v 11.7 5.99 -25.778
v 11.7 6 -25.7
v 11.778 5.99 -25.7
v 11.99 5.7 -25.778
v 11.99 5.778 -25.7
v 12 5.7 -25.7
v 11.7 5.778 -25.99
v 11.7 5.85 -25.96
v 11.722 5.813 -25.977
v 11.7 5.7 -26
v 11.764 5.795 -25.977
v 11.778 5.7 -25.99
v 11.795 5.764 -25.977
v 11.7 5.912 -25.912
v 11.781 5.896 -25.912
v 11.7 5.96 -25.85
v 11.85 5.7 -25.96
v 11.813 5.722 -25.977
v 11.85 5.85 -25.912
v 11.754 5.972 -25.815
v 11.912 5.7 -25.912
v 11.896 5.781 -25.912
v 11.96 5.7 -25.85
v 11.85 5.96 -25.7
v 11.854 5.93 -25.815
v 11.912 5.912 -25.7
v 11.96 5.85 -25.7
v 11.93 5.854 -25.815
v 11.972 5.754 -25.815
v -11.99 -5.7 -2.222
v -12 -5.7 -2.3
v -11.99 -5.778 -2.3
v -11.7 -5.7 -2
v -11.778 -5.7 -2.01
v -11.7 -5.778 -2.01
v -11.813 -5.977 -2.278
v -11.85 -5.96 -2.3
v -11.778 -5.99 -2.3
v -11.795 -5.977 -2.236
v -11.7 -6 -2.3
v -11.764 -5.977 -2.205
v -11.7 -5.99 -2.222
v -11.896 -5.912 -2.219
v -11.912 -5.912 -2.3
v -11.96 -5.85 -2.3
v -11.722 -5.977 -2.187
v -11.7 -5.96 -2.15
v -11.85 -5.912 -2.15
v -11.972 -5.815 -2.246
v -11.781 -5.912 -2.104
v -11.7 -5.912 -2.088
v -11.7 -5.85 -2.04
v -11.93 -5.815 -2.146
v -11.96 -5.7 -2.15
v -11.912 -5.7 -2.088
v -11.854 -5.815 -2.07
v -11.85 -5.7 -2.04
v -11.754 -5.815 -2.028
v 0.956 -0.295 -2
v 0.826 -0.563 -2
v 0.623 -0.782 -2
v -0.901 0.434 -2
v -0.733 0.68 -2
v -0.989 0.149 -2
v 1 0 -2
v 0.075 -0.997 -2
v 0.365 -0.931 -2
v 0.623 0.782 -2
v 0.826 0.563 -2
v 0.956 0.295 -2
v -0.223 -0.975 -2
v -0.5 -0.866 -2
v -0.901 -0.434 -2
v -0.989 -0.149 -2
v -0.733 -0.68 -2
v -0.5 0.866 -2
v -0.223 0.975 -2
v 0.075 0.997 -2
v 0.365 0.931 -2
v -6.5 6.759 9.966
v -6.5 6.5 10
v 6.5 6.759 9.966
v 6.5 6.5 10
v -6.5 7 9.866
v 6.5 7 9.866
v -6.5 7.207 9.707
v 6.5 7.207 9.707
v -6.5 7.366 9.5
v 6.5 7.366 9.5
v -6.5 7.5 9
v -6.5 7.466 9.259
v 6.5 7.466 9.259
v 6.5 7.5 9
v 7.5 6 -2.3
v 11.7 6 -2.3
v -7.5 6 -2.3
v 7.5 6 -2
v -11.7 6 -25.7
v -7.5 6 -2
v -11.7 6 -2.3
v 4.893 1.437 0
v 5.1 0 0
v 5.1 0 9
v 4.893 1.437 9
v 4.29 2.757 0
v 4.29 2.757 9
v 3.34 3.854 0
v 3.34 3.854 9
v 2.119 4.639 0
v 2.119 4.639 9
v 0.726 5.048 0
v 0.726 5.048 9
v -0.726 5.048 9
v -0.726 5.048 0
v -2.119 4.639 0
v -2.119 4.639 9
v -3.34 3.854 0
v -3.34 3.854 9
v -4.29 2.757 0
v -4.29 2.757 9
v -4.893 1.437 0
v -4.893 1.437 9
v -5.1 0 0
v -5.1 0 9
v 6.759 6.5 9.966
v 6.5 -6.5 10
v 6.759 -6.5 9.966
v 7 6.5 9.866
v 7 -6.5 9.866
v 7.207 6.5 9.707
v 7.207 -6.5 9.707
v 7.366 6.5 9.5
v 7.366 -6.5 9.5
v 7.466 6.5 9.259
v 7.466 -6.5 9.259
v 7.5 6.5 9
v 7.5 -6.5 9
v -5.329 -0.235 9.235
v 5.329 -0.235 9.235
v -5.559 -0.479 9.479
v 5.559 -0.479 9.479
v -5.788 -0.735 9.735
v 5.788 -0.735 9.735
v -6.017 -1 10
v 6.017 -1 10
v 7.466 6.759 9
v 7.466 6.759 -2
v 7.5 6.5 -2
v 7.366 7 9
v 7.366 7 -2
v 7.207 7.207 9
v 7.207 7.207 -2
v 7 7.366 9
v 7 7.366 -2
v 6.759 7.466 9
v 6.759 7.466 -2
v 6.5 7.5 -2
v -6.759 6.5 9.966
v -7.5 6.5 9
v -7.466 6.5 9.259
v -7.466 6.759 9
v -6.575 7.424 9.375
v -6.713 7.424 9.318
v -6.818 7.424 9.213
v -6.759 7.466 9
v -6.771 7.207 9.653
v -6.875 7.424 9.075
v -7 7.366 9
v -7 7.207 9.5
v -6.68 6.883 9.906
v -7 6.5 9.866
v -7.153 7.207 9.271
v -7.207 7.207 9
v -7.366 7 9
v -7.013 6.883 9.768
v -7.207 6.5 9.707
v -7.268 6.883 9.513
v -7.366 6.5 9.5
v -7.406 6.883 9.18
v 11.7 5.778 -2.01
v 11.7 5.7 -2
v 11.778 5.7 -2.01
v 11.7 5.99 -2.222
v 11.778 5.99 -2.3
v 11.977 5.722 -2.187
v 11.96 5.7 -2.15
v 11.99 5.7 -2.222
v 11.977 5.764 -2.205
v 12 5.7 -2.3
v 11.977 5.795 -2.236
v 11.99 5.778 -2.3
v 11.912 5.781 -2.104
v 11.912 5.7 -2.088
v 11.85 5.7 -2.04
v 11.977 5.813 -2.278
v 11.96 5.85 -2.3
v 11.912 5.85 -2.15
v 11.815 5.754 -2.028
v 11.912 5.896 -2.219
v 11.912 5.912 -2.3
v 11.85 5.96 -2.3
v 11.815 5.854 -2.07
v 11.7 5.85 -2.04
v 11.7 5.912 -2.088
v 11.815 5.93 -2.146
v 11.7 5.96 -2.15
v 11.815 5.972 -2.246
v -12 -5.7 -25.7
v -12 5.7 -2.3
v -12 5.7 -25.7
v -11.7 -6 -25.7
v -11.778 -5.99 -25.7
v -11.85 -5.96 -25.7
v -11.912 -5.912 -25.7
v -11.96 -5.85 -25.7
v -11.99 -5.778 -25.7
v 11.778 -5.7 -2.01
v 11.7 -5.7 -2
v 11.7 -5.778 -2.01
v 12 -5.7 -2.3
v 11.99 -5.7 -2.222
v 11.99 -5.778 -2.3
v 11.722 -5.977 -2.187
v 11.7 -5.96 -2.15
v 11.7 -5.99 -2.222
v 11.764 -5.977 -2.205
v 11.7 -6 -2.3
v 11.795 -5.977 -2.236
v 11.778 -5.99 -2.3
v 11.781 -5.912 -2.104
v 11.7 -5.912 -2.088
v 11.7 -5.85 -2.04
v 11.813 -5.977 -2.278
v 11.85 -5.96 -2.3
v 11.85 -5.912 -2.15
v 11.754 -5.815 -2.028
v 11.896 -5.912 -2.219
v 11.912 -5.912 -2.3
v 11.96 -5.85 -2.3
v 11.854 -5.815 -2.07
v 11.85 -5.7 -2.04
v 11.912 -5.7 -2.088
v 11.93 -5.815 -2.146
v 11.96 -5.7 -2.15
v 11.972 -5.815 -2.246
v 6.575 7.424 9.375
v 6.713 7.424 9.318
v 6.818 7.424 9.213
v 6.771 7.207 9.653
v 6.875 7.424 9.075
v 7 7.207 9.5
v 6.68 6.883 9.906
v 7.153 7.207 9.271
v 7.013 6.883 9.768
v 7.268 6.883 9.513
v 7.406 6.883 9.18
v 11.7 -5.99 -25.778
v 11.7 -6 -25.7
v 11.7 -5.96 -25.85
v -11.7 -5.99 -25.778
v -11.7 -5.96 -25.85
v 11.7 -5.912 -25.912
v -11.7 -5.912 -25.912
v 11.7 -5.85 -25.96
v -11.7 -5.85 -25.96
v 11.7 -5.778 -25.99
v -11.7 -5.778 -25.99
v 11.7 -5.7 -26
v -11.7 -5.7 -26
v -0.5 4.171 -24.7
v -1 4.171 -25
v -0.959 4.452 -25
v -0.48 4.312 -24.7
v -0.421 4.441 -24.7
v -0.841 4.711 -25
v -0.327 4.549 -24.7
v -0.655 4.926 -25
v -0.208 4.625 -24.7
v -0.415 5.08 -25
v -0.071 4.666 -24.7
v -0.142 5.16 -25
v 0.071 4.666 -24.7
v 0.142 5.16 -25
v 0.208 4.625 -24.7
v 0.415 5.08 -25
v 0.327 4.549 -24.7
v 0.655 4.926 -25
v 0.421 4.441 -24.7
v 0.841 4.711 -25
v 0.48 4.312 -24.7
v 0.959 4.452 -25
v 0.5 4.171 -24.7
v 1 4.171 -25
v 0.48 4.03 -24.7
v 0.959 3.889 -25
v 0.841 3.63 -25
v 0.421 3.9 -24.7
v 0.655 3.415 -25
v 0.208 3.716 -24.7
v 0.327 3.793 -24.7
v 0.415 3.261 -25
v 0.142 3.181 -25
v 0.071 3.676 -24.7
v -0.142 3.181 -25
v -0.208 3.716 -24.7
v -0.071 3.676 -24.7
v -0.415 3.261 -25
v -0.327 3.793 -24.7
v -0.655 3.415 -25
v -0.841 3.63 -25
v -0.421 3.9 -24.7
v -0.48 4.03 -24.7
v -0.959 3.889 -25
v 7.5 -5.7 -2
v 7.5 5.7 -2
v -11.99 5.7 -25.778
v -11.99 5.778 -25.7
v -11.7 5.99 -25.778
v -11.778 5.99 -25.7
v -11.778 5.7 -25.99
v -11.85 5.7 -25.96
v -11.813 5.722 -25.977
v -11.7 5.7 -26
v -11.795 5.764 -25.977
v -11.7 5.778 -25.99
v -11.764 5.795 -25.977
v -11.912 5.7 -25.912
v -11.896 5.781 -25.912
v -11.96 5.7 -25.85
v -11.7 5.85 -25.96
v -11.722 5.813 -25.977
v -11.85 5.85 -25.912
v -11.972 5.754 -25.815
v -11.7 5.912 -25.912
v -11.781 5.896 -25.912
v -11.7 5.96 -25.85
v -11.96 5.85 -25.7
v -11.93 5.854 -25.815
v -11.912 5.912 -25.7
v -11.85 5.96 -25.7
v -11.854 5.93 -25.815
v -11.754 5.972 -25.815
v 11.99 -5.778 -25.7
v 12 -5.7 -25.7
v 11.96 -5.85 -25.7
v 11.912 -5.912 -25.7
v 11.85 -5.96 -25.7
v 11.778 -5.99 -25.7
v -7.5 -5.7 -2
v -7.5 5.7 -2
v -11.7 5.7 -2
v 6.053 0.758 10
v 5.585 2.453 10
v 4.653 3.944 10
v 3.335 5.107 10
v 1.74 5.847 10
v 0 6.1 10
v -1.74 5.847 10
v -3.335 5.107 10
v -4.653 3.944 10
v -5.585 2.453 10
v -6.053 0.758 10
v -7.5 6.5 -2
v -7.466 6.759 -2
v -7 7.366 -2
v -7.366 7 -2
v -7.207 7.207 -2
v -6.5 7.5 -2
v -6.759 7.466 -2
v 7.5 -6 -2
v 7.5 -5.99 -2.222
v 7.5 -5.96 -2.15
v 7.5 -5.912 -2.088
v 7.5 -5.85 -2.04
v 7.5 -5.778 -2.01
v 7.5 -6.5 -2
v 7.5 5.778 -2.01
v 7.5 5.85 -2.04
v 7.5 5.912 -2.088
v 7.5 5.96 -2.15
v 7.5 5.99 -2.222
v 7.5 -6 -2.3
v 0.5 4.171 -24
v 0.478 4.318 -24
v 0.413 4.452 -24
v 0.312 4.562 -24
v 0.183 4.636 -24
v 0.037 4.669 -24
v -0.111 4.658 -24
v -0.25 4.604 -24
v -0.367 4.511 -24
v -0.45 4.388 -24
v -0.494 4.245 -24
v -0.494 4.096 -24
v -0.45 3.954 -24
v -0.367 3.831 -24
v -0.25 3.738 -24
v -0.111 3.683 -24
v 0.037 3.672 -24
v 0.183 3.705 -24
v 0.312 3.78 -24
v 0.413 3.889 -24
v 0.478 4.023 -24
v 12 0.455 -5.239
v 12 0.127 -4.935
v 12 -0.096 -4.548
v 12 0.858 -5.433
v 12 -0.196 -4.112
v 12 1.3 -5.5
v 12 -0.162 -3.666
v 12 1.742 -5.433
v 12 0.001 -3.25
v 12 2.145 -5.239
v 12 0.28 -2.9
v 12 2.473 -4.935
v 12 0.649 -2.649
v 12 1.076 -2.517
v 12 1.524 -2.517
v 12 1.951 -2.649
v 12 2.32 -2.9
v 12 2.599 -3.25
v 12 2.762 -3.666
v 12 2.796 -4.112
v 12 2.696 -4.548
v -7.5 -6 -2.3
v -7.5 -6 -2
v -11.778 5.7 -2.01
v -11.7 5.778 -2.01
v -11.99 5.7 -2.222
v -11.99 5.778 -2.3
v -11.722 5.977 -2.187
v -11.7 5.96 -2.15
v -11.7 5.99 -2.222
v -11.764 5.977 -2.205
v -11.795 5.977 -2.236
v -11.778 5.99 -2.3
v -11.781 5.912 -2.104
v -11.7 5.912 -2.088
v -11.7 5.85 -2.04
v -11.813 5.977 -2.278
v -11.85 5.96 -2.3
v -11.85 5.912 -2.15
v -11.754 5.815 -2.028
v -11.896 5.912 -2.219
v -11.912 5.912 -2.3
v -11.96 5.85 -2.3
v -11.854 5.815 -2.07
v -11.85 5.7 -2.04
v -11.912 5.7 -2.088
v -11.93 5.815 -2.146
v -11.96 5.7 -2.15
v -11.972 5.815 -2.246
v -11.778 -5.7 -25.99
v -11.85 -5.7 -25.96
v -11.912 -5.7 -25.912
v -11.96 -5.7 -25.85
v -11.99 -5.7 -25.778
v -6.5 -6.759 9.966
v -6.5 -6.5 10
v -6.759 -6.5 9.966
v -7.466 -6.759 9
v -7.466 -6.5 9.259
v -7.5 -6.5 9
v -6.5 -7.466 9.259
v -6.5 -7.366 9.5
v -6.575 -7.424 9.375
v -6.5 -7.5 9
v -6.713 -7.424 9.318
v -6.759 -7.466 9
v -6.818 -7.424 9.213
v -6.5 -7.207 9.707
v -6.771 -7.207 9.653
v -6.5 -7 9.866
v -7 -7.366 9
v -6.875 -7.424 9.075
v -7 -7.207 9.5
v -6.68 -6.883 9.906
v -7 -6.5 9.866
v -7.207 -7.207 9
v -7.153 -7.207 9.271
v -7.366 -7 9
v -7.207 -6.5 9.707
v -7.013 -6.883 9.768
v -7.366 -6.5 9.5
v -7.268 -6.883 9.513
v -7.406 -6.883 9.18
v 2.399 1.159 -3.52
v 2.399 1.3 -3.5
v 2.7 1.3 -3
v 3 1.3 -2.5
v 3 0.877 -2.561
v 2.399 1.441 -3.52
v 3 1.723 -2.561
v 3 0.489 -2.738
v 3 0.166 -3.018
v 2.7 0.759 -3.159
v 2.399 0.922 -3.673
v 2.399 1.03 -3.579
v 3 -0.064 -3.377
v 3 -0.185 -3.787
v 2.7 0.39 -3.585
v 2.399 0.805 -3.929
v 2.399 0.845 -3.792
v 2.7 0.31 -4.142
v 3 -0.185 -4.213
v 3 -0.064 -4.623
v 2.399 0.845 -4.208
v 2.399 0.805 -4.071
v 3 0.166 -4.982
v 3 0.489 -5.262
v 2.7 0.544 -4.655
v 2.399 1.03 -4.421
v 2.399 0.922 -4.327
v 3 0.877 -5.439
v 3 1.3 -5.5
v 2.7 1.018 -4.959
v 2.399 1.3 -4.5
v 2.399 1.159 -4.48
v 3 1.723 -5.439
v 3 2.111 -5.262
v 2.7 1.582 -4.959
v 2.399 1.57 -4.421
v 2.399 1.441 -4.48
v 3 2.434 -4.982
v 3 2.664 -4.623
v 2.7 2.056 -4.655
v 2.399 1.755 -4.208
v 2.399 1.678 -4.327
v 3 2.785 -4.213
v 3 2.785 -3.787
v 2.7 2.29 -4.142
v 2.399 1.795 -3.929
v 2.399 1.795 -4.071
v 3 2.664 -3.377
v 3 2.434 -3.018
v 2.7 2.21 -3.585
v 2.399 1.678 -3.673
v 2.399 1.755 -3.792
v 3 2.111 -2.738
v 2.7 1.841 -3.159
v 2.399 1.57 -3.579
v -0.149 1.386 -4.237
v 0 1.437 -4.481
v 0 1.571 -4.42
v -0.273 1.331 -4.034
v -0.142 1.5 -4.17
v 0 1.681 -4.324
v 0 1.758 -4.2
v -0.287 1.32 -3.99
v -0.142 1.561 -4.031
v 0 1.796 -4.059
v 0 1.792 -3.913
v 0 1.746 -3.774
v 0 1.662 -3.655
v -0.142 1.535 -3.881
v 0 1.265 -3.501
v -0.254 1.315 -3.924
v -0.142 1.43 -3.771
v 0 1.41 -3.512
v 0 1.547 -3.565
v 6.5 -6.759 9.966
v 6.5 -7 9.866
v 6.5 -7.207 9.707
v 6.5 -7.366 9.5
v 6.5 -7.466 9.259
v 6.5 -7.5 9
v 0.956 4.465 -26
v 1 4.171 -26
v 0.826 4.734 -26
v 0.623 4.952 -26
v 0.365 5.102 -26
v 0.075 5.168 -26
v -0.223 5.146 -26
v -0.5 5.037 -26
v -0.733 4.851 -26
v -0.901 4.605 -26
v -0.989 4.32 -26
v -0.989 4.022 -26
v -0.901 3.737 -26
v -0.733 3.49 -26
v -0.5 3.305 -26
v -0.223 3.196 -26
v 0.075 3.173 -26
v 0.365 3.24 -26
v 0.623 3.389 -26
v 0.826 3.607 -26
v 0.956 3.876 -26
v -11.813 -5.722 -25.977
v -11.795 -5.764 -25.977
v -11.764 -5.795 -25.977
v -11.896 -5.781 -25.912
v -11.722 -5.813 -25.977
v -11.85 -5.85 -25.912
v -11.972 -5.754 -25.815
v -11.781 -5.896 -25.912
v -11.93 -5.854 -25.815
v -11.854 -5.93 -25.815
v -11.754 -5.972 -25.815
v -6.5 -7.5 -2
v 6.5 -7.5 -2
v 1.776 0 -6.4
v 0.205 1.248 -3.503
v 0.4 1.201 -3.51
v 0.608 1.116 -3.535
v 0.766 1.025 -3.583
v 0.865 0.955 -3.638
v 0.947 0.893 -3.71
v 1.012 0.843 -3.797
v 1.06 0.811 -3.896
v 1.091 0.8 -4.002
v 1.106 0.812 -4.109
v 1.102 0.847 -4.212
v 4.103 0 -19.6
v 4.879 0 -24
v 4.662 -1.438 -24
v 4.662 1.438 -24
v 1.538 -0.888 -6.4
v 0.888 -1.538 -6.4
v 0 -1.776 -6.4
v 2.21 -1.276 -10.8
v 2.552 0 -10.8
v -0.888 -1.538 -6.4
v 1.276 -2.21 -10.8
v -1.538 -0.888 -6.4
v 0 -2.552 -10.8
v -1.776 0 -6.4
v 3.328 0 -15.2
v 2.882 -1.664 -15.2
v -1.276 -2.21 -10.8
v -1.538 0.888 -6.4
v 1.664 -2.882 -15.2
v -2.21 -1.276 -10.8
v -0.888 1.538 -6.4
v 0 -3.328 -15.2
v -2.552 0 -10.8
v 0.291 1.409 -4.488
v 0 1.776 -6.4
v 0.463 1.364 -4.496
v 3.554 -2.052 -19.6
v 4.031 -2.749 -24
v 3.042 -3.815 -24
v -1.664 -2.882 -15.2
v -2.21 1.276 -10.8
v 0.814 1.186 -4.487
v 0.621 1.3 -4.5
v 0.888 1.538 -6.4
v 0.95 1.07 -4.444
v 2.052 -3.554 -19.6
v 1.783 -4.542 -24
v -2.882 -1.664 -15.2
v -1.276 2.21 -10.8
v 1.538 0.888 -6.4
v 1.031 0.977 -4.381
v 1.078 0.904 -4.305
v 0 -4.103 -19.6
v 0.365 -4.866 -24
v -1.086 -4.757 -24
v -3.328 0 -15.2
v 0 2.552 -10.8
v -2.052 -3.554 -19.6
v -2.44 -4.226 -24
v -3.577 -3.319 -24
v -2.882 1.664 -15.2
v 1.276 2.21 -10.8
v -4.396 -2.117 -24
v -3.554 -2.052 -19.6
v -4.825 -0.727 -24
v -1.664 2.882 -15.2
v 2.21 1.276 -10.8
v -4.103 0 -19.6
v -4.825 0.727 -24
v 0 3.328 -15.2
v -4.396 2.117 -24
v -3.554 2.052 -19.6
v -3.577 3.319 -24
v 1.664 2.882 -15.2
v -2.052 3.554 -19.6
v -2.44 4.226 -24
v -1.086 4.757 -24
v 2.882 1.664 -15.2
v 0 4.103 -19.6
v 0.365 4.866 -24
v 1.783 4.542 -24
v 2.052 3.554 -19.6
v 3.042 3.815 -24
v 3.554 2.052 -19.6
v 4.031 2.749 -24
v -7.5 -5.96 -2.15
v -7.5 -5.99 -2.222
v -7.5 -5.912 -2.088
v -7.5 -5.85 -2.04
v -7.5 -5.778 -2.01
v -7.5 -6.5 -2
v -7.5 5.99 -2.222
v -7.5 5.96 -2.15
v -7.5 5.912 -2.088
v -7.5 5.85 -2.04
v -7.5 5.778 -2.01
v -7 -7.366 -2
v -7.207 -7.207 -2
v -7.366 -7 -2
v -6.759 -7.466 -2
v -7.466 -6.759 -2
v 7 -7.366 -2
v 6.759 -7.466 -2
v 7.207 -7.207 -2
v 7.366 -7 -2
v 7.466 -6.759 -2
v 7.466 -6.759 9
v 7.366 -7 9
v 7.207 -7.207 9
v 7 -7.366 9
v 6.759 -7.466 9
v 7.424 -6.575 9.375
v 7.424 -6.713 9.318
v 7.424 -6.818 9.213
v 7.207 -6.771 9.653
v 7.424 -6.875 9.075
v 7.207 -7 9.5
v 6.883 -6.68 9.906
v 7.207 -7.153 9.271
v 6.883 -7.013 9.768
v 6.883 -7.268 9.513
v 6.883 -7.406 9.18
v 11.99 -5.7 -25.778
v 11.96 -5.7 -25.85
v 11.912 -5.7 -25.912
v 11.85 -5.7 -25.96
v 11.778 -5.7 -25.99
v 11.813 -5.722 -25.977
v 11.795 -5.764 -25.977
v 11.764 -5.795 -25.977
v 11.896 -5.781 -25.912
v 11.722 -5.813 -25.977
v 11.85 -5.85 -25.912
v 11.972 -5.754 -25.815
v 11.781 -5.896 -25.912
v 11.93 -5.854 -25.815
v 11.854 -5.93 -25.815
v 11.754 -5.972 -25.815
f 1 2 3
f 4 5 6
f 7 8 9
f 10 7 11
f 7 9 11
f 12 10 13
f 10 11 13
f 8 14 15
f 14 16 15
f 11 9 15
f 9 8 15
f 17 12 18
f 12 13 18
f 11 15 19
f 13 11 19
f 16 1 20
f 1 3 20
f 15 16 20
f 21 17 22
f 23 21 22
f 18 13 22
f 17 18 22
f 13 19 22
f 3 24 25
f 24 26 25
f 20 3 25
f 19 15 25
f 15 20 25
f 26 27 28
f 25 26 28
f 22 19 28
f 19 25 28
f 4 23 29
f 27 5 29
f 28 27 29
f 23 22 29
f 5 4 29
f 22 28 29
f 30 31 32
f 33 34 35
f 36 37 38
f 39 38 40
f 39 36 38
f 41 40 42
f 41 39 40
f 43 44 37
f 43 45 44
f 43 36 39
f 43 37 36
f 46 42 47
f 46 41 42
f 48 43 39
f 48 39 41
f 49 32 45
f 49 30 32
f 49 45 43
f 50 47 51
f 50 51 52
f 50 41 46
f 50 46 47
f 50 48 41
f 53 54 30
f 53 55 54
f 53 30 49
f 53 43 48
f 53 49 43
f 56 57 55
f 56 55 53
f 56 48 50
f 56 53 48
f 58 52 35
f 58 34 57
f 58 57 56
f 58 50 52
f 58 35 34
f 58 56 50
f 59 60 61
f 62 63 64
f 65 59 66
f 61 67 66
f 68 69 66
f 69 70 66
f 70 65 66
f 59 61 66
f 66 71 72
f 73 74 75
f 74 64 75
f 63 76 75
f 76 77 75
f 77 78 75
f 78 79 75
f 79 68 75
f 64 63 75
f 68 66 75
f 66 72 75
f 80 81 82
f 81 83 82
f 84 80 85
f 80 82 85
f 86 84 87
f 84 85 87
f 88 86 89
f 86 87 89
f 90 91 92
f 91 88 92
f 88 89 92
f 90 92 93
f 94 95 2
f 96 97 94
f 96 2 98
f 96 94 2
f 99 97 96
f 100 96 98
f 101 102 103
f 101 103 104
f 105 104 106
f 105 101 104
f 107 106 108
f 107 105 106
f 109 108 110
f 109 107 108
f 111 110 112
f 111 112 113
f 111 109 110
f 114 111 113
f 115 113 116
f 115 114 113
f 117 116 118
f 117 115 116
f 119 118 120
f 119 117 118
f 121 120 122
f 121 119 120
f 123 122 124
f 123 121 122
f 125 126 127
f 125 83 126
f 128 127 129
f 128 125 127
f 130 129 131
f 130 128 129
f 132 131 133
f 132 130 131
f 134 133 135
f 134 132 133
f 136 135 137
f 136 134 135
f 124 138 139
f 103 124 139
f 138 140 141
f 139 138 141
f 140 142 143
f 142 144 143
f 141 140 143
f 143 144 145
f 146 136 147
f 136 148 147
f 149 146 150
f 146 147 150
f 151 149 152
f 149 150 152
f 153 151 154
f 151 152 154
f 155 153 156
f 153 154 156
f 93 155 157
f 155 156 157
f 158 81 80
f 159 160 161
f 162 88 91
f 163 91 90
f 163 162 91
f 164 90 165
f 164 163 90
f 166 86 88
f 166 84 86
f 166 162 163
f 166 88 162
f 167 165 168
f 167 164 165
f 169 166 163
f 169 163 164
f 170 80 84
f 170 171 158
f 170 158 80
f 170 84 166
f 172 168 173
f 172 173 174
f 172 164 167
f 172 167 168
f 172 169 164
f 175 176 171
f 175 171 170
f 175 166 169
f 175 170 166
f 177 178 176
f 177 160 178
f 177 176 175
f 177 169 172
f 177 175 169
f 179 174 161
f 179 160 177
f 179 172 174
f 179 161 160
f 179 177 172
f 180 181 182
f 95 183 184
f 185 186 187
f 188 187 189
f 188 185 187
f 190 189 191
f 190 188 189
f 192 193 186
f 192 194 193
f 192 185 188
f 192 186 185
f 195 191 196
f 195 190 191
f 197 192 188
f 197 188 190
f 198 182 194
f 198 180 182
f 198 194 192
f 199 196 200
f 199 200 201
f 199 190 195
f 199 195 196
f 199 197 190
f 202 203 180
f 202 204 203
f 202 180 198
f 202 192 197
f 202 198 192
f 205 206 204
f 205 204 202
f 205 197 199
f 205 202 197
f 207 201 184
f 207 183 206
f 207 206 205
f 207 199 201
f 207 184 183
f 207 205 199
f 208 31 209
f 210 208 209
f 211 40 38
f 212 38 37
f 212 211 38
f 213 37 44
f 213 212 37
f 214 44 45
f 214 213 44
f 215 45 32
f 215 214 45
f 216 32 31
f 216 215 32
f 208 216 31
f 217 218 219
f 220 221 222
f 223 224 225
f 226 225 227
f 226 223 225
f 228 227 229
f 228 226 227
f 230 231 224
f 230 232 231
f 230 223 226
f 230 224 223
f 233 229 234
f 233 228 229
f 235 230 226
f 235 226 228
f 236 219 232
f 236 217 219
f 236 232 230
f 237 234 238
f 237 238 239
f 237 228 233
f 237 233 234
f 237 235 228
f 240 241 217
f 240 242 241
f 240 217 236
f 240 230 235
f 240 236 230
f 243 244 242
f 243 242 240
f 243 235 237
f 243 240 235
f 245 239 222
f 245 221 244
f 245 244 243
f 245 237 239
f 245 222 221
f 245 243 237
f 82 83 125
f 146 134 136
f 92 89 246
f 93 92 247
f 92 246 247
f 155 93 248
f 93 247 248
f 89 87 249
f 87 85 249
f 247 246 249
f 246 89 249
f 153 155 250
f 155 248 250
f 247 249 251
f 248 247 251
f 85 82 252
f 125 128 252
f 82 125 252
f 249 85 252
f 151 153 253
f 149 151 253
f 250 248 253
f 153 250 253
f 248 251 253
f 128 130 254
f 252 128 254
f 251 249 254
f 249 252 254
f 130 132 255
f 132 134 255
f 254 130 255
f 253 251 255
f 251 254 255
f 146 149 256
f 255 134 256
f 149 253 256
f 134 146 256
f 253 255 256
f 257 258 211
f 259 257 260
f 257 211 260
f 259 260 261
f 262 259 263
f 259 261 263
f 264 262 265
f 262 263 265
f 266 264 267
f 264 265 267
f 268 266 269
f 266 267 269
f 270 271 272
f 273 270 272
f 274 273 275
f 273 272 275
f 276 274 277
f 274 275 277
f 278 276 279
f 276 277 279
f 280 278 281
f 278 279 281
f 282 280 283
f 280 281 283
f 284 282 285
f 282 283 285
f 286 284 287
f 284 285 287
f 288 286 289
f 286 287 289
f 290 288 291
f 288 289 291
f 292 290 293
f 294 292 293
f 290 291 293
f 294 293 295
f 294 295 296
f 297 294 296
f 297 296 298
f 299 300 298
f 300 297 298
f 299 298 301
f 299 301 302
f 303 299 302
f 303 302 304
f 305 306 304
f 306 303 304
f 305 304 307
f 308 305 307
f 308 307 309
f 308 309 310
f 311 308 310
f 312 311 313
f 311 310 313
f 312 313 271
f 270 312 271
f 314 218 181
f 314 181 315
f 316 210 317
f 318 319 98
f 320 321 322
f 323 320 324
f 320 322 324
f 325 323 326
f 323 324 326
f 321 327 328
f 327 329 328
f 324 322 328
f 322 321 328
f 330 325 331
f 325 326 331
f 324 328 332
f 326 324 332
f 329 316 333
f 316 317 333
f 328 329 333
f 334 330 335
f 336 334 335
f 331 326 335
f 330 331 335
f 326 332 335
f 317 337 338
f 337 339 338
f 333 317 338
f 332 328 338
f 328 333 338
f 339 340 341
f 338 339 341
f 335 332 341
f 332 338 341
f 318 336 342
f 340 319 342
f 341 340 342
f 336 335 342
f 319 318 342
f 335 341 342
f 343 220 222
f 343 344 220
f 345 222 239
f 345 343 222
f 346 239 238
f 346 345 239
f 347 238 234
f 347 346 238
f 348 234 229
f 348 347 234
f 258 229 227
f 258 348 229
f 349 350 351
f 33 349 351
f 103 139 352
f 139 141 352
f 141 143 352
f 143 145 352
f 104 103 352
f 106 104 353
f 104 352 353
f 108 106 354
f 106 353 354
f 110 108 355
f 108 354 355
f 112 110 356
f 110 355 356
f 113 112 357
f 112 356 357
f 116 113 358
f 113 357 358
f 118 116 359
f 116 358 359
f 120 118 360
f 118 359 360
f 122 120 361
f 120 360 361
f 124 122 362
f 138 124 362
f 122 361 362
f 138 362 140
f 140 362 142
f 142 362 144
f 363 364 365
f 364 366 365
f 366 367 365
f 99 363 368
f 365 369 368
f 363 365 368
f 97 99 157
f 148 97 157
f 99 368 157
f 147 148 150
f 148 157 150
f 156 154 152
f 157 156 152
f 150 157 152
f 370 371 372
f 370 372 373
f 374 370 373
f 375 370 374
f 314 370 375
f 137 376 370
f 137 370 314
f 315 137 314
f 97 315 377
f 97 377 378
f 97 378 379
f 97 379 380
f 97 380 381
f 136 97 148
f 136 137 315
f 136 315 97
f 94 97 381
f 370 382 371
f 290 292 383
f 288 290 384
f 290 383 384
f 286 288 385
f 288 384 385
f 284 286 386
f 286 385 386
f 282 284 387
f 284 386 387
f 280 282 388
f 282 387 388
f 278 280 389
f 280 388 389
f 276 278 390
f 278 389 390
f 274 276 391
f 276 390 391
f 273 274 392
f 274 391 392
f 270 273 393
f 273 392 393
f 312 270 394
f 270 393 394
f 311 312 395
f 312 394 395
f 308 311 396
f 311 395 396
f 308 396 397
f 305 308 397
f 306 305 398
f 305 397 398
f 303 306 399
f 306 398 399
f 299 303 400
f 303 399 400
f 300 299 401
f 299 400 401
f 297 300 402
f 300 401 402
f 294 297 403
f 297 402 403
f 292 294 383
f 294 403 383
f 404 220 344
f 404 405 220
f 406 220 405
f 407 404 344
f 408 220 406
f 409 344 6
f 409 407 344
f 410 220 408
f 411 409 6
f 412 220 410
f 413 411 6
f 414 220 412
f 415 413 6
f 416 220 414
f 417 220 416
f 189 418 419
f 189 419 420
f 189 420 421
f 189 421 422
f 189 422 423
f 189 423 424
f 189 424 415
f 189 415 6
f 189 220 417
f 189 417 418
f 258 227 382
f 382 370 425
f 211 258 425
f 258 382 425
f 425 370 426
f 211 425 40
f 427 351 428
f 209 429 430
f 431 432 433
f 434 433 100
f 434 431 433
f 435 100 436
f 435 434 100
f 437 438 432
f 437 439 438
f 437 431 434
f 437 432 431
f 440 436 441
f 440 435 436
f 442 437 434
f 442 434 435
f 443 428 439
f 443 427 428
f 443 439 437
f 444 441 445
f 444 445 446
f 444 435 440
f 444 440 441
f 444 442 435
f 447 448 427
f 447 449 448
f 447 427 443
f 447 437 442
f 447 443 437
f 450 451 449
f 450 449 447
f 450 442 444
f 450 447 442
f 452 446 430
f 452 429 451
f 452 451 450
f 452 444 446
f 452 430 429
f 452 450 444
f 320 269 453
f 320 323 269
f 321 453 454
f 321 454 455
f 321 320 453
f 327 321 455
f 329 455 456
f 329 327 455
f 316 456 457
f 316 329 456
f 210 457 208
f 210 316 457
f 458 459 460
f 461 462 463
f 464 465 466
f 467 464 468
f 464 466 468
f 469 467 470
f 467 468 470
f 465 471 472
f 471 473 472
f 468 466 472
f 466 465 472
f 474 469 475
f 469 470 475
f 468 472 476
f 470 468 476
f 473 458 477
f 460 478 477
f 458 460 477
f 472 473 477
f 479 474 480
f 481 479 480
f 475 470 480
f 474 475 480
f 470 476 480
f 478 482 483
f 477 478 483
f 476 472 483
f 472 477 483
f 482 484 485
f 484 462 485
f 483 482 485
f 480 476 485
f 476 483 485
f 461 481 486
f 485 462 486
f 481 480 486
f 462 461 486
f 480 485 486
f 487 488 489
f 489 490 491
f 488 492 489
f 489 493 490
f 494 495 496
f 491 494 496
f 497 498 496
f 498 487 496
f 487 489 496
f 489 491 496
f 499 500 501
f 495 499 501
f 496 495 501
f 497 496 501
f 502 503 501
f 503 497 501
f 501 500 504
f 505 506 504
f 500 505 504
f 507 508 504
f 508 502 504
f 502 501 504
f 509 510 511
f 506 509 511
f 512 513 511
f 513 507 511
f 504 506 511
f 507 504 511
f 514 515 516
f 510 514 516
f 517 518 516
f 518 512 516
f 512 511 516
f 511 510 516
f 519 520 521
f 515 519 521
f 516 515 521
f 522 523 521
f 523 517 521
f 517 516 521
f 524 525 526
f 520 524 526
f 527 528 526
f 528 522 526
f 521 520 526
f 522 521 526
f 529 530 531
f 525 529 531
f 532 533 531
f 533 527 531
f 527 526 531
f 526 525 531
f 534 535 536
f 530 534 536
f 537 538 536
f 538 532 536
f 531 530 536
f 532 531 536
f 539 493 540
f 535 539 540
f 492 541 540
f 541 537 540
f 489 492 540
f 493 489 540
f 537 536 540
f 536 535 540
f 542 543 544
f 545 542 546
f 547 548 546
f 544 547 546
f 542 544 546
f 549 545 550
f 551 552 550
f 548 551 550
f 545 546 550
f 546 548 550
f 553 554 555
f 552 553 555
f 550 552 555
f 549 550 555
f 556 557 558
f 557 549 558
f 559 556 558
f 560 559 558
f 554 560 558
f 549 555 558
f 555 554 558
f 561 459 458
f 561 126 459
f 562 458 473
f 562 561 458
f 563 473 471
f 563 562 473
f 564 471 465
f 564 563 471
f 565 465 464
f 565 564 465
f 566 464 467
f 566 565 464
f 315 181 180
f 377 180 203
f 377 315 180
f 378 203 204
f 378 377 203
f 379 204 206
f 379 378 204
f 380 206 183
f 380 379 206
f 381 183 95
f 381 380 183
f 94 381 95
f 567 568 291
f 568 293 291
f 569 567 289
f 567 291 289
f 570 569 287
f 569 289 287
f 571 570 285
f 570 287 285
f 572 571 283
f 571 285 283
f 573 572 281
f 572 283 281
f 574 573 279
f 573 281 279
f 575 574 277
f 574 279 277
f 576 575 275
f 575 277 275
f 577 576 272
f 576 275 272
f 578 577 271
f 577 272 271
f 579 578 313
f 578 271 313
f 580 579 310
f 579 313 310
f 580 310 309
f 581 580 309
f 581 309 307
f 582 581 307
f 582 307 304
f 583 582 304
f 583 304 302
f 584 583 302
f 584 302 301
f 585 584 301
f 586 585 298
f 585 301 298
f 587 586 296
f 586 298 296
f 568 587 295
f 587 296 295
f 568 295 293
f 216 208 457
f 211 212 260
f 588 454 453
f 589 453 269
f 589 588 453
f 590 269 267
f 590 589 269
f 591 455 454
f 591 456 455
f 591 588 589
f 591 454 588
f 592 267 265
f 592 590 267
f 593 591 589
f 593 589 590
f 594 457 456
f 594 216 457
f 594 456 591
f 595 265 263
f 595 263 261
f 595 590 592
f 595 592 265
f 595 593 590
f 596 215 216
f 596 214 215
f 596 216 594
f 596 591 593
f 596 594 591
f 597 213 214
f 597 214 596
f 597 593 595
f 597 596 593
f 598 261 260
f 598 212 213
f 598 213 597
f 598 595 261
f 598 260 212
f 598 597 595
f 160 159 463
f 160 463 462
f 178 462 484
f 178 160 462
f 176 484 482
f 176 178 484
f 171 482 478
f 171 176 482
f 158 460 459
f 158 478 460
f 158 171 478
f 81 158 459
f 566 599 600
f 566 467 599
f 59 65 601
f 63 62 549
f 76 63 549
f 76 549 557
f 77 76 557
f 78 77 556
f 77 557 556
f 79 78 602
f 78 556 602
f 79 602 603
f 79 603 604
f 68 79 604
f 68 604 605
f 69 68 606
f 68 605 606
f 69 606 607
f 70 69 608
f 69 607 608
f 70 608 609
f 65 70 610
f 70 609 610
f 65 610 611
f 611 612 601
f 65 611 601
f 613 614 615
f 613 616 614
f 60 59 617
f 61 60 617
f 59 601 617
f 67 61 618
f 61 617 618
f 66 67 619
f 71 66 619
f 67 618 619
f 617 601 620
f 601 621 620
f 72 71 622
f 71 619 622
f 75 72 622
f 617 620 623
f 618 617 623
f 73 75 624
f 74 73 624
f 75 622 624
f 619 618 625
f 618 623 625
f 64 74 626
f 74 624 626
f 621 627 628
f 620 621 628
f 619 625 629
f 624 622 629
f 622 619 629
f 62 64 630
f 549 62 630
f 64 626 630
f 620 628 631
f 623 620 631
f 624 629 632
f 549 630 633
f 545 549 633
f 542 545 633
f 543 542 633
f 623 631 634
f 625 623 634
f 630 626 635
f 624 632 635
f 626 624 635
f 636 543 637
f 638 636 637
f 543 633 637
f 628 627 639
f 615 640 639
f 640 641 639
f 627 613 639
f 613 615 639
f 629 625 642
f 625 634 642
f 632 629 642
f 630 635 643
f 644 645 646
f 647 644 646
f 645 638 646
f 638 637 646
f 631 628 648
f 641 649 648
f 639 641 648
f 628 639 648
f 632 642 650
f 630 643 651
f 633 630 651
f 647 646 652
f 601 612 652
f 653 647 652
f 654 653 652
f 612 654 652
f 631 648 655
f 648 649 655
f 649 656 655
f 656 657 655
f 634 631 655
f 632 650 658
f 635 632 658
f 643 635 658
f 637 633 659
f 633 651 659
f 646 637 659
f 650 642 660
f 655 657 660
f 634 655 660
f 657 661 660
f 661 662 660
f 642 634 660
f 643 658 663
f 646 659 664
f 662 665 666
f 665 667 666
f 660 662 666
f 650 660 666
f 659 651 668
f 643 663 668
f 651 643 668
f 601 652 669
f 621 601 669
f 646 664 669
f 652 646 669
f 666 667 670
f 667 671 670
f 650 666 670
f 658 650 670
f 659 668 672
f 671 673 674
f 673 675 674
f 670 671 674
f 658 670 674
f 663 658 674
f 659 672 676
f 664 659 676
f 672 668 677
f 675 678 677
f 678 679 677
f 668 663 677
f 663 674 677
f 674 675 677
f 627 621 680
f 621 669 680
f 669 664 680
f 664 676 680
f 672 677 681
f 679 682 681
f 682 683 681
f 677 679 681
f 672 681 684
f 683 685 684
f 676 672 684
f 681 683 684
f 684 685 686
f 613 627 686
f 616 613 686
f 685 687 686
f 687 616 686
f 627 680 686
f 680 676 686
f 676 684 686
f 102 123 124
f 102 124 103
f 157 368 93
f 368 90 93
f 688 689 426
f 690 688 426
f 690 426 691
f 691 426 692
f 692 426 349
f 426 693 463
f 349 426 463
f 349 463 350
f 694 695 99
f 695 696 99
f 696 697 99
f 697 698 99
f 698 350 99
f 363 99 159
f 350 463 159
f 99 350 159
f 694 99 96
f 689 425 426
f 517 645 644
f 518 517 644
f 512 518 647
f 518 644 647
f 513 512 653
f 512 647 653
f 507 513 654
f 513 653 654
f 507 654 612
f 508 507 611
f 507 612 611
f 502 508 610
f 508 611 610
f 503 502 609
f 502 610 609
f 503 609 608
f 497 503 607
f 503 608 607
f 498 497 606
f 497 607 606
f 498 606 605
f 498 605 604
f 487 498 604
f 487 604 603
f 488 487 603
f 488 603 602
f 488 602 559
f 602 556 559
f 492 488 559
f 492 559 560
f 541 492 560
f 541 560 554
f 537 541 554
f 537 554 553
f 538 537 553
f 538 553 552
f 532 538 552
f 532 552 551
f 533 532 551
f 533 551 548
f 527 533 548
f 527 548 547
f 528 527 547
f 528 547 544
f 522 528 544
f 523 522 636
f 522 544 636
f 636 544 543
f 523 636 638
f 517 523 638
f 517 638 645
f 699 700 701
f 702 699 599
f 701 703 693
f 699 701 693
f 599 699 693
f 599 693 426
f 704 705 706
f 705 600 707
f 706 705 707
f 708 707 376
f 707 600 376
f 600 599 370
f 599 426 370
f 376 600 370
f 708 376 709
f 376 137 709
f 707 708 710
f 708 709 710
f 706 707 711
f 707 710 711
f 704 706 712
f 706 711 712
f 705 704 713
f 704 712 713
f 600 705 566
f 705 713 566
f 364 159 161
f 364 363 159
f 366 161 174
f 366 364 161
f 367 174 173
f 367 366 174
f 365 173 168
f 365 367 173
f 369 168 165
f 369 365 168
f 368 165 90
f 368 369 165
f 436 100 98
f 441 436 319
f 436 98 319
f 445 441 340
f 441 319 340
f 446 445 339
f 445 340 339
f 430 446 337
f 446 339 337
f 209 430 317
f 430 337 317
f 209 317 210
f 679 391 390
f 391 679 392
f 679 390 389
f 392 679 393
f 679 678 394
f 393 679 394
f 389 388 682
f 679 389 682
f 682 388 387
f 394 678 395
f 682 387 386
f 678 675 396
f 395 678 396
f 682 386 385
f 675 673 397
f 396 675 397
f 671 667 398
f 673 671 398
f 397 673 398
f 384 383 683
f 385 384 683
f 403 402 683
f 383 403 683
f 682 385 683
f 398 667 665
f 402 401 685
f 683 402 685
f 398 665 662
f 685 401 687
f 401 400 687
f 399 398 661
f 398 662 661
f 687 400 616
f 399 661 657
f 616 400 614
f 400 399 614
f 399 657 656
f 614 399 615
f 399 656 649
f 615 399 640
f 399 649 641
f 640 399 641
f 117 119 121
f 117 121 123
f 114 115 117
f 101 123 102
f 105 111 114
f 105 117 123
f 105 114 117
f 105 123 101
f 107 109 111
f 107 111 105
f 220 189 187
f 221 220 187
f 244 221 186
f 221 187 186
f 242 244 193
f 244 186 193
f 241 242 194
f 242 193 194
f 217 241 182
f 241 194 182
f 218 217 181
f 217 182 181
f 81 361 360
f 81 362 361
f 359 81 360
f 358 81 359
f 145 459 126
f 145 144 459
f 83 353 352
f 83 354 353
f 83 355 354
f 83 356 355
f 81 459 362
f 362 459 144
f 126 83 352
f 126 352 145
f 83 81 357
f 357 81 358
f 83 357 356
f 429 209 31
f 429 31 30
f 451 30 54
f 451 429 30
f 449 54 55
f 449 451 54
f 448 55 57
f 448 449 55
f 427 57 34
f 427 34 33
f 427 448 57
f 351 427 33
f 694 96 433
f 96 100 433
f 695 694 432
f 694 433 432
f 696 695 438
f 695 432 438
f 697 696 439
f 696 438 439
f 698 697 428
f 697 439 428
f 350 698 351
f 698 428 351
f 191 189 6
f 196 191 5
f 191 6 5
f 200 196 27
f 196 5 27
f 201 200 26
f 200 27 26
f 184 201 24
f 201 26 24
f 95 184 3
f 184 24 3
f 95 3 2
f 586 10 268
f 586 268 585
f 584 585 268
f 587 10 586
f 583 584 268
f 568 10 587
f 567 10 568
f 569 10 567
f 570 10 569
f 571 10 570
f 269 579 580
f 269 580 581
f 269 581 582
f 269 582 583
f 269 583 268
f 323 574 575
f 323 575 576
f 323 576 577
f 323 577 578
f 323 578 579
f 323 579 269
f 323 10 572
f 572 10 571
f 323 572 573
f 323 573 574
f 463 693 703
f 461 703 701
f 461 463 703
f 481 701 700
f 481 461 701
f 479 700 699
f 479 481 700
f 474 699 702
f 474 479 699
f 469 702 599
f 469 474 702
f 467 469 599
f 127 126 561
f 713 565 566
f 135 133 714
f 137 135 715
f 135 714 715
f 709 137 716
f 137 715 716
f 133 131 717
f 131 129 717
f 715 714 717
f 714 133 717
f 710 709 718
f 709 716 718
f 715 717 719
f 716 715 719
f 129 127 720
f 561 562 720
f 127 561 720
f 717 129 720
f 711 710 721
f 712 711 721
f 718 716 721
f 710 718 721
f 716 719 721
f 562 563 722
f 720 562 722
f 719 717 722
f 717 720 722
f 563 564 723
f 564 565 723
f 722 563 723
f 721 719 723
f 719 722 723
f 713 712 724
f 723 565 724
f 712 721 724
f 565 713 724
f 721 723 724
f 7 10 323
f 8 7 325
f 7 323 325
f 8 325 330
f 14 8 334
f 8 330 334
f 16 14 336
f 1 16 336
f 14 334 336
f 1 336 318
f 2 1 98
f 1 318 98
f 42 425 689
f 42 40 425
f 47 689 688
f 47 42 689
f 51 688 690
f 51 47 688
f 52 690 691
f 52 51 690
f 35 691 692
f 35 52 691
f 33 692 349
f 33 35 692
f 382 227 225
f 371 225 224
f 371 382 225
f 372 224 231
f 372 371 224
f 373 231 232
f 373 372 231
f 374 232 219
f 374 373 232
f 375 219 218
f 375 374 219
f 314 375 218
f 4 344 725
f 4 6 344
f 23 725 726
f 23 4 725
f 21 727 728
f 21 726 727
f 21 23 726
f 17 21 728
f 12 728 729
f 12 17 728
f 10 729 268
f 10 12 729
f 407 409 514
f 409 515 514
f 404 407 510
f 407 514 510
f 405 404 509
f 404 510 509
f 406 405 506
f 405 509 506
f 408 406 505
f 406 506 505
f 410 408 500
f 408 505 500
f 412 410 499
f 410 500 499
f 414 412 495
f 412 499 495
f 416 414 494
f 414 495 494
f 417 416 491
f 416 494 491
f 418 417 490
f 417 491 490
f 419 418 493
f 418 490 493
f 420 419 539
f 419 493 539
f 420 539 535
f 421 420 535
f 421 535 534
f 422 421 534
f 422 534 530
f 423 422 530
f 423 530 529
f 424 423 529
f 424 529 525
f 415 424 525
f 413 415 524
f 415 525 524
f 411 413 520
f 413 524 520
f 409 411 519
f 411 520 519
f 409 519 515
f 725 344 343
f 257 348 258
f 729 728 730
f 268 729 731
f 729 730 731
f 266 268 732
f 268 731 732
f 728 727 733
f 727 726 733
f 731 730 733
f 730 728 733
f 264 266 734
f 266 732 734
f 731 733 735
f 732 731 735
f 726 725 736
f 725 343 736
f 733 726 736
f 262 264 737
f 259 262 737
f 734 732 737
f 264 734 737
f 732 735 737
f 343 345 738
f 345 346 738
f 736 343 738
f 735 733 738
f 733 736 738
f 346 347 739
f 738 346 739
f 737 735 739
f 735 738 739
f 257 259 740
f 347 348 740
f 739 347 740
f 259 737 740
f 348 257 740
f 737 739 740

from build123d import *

# Parameters (mm, degrees)
SKIZZE1_W                          = 15
SKIZZE1_H                          = 15
AUFSATZ_LINEAR_AUSTRAGEN1_DEPTH    = 10
FASE1_SIZE                         = 1
SKIZZE1_2_W                        = 15
SKIZZE1_2_H                        = 15
AUFSATZ_LINEAR_AUSTRAGEN2_DEPTH    = 2
VERRUNDUNG1_R                      = 1
SKIZZE2_W                          = 24
SKIZZE2_H                          = 12
AUFSATZ_LINEAR_AUSTRAGEN3_DEPTH    = 24
F_1_0_1_DURCHMESSER_BOHRUNG1_D     = 1
F_1_0_1_DURCHMESSER_BOHRUNG1_DEPTH = 12
F_1_0_1_DURCHMESSER_BOHRUNG1_TIP   = 0.30043031
F_1_0_1_DURCHMESSER_BOHRUNG2_D     = 1
F_1_0_1_DURCHMESSER_BOHRUNG2_DEPTH = 2.2
F_1_0_1_DURCHMESSER_BOHRUNG2_TIP   = 0.30043031
F_3_0_3_DURCHMESSER_BOHRUNG1_D     = 3
F_3_0_3_DURCHMESSER_BOHRUNG1_DEPTH = 9
F_3_0_3_DURCHMESSER_BOHRUNG1_TIP   = 0.901290929
F_2_0_2_DURCHMESSER_BOHRUNG1_D     = 2
F_2_0_2_DURCHMESSER_BOHRUNG1_DEPTH = 1
F_2_0_2_DURCHMESSER_BOHRUNG1_TIP   = 0.600860619
VERRUNDUNG6_R                      = 0.3


with BuildPart() as part:
    # Skizze1 → Aufsatz-Linear austragen1 (new body)
    with BuildSketch(Plane.XY):
        Rectangle(SKIZZE1_W, SKIZZE1_H)
        with BuildLine():
            Line((-5.1, 0), (5.1, 0))
            ThreePointArc((5.1, 0), (0, 5.1), (-5.1, 0))
        make_face(mode=Mode.SUBTRACT)
    extrude(amount=AUFSATZ_LINEAR_AUSTRAGEN1_DEPTH)

    # Fase1
    fase1_edges = [part.edges().sort_by_distance(p)[0] for p in [
        (0, 5.1, 10),
        (0, 0, 10),
    ]]
    chamfer(fase1_edges, length=FASE1_SIZE)

    # Skizze1_2 → Aufsatz-Linear austragen2 (add)
    with BuildSketch(Plane.XY):
        Rectangle(SKIZZE1_2_W, SKIZZE1_2_H)
        with BuildLine():
            ThreePointArc((5.1, 0), (0, 5.1), (-5.1, 0))
            Line((-5.1, 0), (5.1, 0))
        make_face(mode=Mode.SUBTRACT)
        with BuildLine():
            Line((-5.1, 0), (5.1, 0))
            ThreePointArc((5.1, 0), (0, 5.1), (-5.1, 0))
        make_face()
    extrude(amount=-AUFSATZ_LINEAR_AUSTRAGEN2_DEPTH)

    # Verrundung1
    verrundung1_edges = [part.edges().sort_by_distance(p)[0] for p in [
        (-7.5, 0, 10),
        (0, -7.5, 10),
        (7.5, 0, 10),
        (0, 7.5, 10),
        (7.5, -7.5, 4),
        (-7.5, -7.5, 4),
        (-7.5, 7.5, 4),
        (7.5, 7.5, 4),
    ]]
    fillet(verrundung1_edges, radius=VERRUNDUNG1_R)

    # Skizze2 → Aufsatz-Linear austragen3 (add)
    with BuildSketch(Plane(origin=(0, 0, -2), x_dir=(-1, 0, 0), z_dir=(0, 0, -1))):
        Rectangle(SKIZZE2_W, SKIZZE2_H)
    extrude(amount=AUFSATZ_LINEAR_AUSTRAGEN3_DEPTH)

    # Skizze12 → Schnitt-Rotation1 (revolve, cut)
    with BuildSketch(Plane(origin=(0, 0, 0), x_dir=(1, 0, 0), z_dir=(0, 1, 0)), mode=Mode.PRIVATE) as schnitt_rotation1_sk:
        Polygon((-1, 2), (-4.879193576, 24), (0, 24), (0, 2), align=None)
    revolve(schnitt_rotation1_sk.sketch.rotate(Axis((0, 0, -2), (0, 0, -1)), 180), axis=Axis((0, 0, -2), (0, 0, -1)), mode=Mode.SUBTRACT)  # turned: the seam where the file's is

    # 1.0 _1_ Durchmesser Bohrung1
    with Locations(Plane(origin=(12, 0, -12), x_dir=(0, 0, 1), z_dir=(1, 0, 0))):
        with Locations((8, -1.3)):
            Hole(F_1_0_1_DURCHMESSER_BOHRUNG1_D / 2, depth=F_1_0_1_DURCHMESSER_BOHRUNG1_DEPTH)
            with Locations((0, 0, -(F_1_0_1_DURCHMESSER_BOHRUNG1_DEPTH + F_1_0_1_DURCHMESSER_BOHRUNG1_TIP / 2))):  # 118° drill point
                Cone(0, F_1_0_1_DURCHMESSER_BOHRUNG1_D / 2, F_1_0_1_DURCHMESSER_BOHRUNG1_TIP, mode=Mode.SUBTRACT)

    # 1.0 _1_ Durchmesser Bohrung2
    with Locations(Plane(origin=(0, 0, -26), x_dir=(-1, 0, 0), z_dir=(0, 0, -1))):
        with Locations((0, 4.170639233)):
            Hole(F_1_0_1_DURCHMESSER_BOHRUNG2_D / 2, depth=F_1_0_1_DURCHMESSER_BOHRUNG2_DEPTH)
            with Locations((0, 0, -(F_1_0_1_DURCHMESSER_BOHRUNG2_DEPTH + F_1_0_1_DURCHMESSER_BOHRUNG2_TIP / 2))):  # 118° drill point
                Cone(0, F_1_0_1_DURCHMESSER_BOHRUNG2_D / 2, F_1_0_1_DURCHMESSER_BOHRUNG2_TIP, mode=Mode.SUBTRACT)

    # 3.0 _3_ Durchmesser Bohrung1
    with Locations(Plane(origin=(12, 0, -12), x_dir=(0, 0, 1), z_dir=(1, 0, 0))):
        with Locations((8, -1.3)):
            Hole(F_3_0_3_DURCHMESSER_BOHRUNG1_D / 2, depth=F_3_0_3_DURCHMESSER_BOHRUNG1_DEPTH)
            with Locations((0, 0, -(F_3_0_3_DURCHMESSER_BOHRUNG1_DEPTH + F_3_0_3_DURCHMESSER_BOHRUNG1_TIP / 2))):  # 118° drill point
                Cone(0, F_3_0_3_DURCHMESSER_BOHRUNG1_D / 2, F_3_0_3_DURCHMESSER_BOHRUNG1_TIP, mode=Mode.SUBTRACT)

    # 2.0 _2_ Durchmesser Bohrung1
    with Locations(Plane(origin=(0, 0, -26), x_dir=(-1, 0, 0), z_dir=(0, 0, -1))):
        with Locations((0, 4.170639233)):
            Hole(F_2_0_2_DURCHMESSER_BOHRUNG1_D / 2, depth=F_2_0_2_DURCHMESSER_BOHRUNG1_DEPTH)
            with Locations((0, 0, -(F_2_0_2_DURCHMESSER_BOHRUNG1_DEPTH + F_2_0_2_DURCHMESSER_BOHRUNG1_TIP / 2))):  # 118° drill point
                Cone(0, F_2_0_2_DURCHMESSER_BOHRUNG1_D / 2, F_2_0_2_DURCHMESSER_BOHRUNG1_TIP, mode=Mode.SUBTRACT)

    # Verrundung6
    verrundung6_edges = [part.edges().sort_by_distance(p)[0] for p in [
        (-12, 0, -2),
        (-12, -6, -14),
        (-9.75, 6, -2),
        (9.75, 6, -2),
        (-12, 6, -14),
        (12, 0, -2),
        (12, 6, -14),
        (9.75, -6, -2),
        (-9.75, -6, -2),
        (12, -6, -14),
        (-12, 0, -26),
        (0, 6, -26),
        (12, 0, -26),
        (0, -6, -26),
    ]]
    fillet(verrundung6_edges, radius=VERRUNDUNG6_R)


solid = part.part
